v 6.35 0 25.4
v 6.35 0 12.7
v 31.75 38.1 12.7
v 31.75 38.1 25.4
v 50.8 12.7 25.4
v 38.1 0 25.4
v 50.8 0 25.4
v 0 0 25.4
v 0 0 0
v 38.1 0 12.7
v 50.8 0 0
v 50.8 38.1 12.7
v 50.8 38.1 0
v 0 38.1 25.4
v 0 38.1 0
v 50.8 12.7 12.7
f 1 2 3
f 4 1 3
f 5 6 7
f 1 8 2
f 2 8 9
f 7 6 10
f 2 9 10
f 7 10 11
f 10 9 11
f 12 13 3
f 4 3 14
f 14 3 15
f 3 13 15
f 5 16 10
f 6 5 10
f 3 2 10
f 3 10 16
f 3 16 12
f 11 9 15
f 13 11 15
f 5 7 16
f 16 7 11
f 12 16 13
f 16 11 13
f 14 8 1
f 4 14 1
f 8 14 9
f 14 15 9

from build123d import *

# Parameters (mm, degrees)
F0_W     = 38.1
F0_H     = 12.7
F1_DEPTH = 50.8
F3_DEPTH = 12.7
F5_DEPTH = 12.7


with BuildPart() as f1:
    # F0 (on Right) → F1 (new body)
    with BuildSketch(Plane.YZ):
        with Locations((19.05, 6.35)):
            Rectangle(F0_W, F0_H)
    extrude(amount=F1_DEPTH)

    # F2 (on face) → F3 (join)
    with BuildSketch(Plane.XY.offset(12.7)):
        Polygon((31.75, 38.1), (0, 38.1), (0, 0), (6.35, 0), align=None)
    extrude(amount=F3_DEPTH)

    # F4 (on face) → F5 (join)
    with BuildSketch(Plane.XY.offset(12.7)):
        Polygon((38.1, 0), (50.8, 0), (50.8, 12.7), align=None)
    extrude(amount=F5_DEPTH)


solid = f1.part
